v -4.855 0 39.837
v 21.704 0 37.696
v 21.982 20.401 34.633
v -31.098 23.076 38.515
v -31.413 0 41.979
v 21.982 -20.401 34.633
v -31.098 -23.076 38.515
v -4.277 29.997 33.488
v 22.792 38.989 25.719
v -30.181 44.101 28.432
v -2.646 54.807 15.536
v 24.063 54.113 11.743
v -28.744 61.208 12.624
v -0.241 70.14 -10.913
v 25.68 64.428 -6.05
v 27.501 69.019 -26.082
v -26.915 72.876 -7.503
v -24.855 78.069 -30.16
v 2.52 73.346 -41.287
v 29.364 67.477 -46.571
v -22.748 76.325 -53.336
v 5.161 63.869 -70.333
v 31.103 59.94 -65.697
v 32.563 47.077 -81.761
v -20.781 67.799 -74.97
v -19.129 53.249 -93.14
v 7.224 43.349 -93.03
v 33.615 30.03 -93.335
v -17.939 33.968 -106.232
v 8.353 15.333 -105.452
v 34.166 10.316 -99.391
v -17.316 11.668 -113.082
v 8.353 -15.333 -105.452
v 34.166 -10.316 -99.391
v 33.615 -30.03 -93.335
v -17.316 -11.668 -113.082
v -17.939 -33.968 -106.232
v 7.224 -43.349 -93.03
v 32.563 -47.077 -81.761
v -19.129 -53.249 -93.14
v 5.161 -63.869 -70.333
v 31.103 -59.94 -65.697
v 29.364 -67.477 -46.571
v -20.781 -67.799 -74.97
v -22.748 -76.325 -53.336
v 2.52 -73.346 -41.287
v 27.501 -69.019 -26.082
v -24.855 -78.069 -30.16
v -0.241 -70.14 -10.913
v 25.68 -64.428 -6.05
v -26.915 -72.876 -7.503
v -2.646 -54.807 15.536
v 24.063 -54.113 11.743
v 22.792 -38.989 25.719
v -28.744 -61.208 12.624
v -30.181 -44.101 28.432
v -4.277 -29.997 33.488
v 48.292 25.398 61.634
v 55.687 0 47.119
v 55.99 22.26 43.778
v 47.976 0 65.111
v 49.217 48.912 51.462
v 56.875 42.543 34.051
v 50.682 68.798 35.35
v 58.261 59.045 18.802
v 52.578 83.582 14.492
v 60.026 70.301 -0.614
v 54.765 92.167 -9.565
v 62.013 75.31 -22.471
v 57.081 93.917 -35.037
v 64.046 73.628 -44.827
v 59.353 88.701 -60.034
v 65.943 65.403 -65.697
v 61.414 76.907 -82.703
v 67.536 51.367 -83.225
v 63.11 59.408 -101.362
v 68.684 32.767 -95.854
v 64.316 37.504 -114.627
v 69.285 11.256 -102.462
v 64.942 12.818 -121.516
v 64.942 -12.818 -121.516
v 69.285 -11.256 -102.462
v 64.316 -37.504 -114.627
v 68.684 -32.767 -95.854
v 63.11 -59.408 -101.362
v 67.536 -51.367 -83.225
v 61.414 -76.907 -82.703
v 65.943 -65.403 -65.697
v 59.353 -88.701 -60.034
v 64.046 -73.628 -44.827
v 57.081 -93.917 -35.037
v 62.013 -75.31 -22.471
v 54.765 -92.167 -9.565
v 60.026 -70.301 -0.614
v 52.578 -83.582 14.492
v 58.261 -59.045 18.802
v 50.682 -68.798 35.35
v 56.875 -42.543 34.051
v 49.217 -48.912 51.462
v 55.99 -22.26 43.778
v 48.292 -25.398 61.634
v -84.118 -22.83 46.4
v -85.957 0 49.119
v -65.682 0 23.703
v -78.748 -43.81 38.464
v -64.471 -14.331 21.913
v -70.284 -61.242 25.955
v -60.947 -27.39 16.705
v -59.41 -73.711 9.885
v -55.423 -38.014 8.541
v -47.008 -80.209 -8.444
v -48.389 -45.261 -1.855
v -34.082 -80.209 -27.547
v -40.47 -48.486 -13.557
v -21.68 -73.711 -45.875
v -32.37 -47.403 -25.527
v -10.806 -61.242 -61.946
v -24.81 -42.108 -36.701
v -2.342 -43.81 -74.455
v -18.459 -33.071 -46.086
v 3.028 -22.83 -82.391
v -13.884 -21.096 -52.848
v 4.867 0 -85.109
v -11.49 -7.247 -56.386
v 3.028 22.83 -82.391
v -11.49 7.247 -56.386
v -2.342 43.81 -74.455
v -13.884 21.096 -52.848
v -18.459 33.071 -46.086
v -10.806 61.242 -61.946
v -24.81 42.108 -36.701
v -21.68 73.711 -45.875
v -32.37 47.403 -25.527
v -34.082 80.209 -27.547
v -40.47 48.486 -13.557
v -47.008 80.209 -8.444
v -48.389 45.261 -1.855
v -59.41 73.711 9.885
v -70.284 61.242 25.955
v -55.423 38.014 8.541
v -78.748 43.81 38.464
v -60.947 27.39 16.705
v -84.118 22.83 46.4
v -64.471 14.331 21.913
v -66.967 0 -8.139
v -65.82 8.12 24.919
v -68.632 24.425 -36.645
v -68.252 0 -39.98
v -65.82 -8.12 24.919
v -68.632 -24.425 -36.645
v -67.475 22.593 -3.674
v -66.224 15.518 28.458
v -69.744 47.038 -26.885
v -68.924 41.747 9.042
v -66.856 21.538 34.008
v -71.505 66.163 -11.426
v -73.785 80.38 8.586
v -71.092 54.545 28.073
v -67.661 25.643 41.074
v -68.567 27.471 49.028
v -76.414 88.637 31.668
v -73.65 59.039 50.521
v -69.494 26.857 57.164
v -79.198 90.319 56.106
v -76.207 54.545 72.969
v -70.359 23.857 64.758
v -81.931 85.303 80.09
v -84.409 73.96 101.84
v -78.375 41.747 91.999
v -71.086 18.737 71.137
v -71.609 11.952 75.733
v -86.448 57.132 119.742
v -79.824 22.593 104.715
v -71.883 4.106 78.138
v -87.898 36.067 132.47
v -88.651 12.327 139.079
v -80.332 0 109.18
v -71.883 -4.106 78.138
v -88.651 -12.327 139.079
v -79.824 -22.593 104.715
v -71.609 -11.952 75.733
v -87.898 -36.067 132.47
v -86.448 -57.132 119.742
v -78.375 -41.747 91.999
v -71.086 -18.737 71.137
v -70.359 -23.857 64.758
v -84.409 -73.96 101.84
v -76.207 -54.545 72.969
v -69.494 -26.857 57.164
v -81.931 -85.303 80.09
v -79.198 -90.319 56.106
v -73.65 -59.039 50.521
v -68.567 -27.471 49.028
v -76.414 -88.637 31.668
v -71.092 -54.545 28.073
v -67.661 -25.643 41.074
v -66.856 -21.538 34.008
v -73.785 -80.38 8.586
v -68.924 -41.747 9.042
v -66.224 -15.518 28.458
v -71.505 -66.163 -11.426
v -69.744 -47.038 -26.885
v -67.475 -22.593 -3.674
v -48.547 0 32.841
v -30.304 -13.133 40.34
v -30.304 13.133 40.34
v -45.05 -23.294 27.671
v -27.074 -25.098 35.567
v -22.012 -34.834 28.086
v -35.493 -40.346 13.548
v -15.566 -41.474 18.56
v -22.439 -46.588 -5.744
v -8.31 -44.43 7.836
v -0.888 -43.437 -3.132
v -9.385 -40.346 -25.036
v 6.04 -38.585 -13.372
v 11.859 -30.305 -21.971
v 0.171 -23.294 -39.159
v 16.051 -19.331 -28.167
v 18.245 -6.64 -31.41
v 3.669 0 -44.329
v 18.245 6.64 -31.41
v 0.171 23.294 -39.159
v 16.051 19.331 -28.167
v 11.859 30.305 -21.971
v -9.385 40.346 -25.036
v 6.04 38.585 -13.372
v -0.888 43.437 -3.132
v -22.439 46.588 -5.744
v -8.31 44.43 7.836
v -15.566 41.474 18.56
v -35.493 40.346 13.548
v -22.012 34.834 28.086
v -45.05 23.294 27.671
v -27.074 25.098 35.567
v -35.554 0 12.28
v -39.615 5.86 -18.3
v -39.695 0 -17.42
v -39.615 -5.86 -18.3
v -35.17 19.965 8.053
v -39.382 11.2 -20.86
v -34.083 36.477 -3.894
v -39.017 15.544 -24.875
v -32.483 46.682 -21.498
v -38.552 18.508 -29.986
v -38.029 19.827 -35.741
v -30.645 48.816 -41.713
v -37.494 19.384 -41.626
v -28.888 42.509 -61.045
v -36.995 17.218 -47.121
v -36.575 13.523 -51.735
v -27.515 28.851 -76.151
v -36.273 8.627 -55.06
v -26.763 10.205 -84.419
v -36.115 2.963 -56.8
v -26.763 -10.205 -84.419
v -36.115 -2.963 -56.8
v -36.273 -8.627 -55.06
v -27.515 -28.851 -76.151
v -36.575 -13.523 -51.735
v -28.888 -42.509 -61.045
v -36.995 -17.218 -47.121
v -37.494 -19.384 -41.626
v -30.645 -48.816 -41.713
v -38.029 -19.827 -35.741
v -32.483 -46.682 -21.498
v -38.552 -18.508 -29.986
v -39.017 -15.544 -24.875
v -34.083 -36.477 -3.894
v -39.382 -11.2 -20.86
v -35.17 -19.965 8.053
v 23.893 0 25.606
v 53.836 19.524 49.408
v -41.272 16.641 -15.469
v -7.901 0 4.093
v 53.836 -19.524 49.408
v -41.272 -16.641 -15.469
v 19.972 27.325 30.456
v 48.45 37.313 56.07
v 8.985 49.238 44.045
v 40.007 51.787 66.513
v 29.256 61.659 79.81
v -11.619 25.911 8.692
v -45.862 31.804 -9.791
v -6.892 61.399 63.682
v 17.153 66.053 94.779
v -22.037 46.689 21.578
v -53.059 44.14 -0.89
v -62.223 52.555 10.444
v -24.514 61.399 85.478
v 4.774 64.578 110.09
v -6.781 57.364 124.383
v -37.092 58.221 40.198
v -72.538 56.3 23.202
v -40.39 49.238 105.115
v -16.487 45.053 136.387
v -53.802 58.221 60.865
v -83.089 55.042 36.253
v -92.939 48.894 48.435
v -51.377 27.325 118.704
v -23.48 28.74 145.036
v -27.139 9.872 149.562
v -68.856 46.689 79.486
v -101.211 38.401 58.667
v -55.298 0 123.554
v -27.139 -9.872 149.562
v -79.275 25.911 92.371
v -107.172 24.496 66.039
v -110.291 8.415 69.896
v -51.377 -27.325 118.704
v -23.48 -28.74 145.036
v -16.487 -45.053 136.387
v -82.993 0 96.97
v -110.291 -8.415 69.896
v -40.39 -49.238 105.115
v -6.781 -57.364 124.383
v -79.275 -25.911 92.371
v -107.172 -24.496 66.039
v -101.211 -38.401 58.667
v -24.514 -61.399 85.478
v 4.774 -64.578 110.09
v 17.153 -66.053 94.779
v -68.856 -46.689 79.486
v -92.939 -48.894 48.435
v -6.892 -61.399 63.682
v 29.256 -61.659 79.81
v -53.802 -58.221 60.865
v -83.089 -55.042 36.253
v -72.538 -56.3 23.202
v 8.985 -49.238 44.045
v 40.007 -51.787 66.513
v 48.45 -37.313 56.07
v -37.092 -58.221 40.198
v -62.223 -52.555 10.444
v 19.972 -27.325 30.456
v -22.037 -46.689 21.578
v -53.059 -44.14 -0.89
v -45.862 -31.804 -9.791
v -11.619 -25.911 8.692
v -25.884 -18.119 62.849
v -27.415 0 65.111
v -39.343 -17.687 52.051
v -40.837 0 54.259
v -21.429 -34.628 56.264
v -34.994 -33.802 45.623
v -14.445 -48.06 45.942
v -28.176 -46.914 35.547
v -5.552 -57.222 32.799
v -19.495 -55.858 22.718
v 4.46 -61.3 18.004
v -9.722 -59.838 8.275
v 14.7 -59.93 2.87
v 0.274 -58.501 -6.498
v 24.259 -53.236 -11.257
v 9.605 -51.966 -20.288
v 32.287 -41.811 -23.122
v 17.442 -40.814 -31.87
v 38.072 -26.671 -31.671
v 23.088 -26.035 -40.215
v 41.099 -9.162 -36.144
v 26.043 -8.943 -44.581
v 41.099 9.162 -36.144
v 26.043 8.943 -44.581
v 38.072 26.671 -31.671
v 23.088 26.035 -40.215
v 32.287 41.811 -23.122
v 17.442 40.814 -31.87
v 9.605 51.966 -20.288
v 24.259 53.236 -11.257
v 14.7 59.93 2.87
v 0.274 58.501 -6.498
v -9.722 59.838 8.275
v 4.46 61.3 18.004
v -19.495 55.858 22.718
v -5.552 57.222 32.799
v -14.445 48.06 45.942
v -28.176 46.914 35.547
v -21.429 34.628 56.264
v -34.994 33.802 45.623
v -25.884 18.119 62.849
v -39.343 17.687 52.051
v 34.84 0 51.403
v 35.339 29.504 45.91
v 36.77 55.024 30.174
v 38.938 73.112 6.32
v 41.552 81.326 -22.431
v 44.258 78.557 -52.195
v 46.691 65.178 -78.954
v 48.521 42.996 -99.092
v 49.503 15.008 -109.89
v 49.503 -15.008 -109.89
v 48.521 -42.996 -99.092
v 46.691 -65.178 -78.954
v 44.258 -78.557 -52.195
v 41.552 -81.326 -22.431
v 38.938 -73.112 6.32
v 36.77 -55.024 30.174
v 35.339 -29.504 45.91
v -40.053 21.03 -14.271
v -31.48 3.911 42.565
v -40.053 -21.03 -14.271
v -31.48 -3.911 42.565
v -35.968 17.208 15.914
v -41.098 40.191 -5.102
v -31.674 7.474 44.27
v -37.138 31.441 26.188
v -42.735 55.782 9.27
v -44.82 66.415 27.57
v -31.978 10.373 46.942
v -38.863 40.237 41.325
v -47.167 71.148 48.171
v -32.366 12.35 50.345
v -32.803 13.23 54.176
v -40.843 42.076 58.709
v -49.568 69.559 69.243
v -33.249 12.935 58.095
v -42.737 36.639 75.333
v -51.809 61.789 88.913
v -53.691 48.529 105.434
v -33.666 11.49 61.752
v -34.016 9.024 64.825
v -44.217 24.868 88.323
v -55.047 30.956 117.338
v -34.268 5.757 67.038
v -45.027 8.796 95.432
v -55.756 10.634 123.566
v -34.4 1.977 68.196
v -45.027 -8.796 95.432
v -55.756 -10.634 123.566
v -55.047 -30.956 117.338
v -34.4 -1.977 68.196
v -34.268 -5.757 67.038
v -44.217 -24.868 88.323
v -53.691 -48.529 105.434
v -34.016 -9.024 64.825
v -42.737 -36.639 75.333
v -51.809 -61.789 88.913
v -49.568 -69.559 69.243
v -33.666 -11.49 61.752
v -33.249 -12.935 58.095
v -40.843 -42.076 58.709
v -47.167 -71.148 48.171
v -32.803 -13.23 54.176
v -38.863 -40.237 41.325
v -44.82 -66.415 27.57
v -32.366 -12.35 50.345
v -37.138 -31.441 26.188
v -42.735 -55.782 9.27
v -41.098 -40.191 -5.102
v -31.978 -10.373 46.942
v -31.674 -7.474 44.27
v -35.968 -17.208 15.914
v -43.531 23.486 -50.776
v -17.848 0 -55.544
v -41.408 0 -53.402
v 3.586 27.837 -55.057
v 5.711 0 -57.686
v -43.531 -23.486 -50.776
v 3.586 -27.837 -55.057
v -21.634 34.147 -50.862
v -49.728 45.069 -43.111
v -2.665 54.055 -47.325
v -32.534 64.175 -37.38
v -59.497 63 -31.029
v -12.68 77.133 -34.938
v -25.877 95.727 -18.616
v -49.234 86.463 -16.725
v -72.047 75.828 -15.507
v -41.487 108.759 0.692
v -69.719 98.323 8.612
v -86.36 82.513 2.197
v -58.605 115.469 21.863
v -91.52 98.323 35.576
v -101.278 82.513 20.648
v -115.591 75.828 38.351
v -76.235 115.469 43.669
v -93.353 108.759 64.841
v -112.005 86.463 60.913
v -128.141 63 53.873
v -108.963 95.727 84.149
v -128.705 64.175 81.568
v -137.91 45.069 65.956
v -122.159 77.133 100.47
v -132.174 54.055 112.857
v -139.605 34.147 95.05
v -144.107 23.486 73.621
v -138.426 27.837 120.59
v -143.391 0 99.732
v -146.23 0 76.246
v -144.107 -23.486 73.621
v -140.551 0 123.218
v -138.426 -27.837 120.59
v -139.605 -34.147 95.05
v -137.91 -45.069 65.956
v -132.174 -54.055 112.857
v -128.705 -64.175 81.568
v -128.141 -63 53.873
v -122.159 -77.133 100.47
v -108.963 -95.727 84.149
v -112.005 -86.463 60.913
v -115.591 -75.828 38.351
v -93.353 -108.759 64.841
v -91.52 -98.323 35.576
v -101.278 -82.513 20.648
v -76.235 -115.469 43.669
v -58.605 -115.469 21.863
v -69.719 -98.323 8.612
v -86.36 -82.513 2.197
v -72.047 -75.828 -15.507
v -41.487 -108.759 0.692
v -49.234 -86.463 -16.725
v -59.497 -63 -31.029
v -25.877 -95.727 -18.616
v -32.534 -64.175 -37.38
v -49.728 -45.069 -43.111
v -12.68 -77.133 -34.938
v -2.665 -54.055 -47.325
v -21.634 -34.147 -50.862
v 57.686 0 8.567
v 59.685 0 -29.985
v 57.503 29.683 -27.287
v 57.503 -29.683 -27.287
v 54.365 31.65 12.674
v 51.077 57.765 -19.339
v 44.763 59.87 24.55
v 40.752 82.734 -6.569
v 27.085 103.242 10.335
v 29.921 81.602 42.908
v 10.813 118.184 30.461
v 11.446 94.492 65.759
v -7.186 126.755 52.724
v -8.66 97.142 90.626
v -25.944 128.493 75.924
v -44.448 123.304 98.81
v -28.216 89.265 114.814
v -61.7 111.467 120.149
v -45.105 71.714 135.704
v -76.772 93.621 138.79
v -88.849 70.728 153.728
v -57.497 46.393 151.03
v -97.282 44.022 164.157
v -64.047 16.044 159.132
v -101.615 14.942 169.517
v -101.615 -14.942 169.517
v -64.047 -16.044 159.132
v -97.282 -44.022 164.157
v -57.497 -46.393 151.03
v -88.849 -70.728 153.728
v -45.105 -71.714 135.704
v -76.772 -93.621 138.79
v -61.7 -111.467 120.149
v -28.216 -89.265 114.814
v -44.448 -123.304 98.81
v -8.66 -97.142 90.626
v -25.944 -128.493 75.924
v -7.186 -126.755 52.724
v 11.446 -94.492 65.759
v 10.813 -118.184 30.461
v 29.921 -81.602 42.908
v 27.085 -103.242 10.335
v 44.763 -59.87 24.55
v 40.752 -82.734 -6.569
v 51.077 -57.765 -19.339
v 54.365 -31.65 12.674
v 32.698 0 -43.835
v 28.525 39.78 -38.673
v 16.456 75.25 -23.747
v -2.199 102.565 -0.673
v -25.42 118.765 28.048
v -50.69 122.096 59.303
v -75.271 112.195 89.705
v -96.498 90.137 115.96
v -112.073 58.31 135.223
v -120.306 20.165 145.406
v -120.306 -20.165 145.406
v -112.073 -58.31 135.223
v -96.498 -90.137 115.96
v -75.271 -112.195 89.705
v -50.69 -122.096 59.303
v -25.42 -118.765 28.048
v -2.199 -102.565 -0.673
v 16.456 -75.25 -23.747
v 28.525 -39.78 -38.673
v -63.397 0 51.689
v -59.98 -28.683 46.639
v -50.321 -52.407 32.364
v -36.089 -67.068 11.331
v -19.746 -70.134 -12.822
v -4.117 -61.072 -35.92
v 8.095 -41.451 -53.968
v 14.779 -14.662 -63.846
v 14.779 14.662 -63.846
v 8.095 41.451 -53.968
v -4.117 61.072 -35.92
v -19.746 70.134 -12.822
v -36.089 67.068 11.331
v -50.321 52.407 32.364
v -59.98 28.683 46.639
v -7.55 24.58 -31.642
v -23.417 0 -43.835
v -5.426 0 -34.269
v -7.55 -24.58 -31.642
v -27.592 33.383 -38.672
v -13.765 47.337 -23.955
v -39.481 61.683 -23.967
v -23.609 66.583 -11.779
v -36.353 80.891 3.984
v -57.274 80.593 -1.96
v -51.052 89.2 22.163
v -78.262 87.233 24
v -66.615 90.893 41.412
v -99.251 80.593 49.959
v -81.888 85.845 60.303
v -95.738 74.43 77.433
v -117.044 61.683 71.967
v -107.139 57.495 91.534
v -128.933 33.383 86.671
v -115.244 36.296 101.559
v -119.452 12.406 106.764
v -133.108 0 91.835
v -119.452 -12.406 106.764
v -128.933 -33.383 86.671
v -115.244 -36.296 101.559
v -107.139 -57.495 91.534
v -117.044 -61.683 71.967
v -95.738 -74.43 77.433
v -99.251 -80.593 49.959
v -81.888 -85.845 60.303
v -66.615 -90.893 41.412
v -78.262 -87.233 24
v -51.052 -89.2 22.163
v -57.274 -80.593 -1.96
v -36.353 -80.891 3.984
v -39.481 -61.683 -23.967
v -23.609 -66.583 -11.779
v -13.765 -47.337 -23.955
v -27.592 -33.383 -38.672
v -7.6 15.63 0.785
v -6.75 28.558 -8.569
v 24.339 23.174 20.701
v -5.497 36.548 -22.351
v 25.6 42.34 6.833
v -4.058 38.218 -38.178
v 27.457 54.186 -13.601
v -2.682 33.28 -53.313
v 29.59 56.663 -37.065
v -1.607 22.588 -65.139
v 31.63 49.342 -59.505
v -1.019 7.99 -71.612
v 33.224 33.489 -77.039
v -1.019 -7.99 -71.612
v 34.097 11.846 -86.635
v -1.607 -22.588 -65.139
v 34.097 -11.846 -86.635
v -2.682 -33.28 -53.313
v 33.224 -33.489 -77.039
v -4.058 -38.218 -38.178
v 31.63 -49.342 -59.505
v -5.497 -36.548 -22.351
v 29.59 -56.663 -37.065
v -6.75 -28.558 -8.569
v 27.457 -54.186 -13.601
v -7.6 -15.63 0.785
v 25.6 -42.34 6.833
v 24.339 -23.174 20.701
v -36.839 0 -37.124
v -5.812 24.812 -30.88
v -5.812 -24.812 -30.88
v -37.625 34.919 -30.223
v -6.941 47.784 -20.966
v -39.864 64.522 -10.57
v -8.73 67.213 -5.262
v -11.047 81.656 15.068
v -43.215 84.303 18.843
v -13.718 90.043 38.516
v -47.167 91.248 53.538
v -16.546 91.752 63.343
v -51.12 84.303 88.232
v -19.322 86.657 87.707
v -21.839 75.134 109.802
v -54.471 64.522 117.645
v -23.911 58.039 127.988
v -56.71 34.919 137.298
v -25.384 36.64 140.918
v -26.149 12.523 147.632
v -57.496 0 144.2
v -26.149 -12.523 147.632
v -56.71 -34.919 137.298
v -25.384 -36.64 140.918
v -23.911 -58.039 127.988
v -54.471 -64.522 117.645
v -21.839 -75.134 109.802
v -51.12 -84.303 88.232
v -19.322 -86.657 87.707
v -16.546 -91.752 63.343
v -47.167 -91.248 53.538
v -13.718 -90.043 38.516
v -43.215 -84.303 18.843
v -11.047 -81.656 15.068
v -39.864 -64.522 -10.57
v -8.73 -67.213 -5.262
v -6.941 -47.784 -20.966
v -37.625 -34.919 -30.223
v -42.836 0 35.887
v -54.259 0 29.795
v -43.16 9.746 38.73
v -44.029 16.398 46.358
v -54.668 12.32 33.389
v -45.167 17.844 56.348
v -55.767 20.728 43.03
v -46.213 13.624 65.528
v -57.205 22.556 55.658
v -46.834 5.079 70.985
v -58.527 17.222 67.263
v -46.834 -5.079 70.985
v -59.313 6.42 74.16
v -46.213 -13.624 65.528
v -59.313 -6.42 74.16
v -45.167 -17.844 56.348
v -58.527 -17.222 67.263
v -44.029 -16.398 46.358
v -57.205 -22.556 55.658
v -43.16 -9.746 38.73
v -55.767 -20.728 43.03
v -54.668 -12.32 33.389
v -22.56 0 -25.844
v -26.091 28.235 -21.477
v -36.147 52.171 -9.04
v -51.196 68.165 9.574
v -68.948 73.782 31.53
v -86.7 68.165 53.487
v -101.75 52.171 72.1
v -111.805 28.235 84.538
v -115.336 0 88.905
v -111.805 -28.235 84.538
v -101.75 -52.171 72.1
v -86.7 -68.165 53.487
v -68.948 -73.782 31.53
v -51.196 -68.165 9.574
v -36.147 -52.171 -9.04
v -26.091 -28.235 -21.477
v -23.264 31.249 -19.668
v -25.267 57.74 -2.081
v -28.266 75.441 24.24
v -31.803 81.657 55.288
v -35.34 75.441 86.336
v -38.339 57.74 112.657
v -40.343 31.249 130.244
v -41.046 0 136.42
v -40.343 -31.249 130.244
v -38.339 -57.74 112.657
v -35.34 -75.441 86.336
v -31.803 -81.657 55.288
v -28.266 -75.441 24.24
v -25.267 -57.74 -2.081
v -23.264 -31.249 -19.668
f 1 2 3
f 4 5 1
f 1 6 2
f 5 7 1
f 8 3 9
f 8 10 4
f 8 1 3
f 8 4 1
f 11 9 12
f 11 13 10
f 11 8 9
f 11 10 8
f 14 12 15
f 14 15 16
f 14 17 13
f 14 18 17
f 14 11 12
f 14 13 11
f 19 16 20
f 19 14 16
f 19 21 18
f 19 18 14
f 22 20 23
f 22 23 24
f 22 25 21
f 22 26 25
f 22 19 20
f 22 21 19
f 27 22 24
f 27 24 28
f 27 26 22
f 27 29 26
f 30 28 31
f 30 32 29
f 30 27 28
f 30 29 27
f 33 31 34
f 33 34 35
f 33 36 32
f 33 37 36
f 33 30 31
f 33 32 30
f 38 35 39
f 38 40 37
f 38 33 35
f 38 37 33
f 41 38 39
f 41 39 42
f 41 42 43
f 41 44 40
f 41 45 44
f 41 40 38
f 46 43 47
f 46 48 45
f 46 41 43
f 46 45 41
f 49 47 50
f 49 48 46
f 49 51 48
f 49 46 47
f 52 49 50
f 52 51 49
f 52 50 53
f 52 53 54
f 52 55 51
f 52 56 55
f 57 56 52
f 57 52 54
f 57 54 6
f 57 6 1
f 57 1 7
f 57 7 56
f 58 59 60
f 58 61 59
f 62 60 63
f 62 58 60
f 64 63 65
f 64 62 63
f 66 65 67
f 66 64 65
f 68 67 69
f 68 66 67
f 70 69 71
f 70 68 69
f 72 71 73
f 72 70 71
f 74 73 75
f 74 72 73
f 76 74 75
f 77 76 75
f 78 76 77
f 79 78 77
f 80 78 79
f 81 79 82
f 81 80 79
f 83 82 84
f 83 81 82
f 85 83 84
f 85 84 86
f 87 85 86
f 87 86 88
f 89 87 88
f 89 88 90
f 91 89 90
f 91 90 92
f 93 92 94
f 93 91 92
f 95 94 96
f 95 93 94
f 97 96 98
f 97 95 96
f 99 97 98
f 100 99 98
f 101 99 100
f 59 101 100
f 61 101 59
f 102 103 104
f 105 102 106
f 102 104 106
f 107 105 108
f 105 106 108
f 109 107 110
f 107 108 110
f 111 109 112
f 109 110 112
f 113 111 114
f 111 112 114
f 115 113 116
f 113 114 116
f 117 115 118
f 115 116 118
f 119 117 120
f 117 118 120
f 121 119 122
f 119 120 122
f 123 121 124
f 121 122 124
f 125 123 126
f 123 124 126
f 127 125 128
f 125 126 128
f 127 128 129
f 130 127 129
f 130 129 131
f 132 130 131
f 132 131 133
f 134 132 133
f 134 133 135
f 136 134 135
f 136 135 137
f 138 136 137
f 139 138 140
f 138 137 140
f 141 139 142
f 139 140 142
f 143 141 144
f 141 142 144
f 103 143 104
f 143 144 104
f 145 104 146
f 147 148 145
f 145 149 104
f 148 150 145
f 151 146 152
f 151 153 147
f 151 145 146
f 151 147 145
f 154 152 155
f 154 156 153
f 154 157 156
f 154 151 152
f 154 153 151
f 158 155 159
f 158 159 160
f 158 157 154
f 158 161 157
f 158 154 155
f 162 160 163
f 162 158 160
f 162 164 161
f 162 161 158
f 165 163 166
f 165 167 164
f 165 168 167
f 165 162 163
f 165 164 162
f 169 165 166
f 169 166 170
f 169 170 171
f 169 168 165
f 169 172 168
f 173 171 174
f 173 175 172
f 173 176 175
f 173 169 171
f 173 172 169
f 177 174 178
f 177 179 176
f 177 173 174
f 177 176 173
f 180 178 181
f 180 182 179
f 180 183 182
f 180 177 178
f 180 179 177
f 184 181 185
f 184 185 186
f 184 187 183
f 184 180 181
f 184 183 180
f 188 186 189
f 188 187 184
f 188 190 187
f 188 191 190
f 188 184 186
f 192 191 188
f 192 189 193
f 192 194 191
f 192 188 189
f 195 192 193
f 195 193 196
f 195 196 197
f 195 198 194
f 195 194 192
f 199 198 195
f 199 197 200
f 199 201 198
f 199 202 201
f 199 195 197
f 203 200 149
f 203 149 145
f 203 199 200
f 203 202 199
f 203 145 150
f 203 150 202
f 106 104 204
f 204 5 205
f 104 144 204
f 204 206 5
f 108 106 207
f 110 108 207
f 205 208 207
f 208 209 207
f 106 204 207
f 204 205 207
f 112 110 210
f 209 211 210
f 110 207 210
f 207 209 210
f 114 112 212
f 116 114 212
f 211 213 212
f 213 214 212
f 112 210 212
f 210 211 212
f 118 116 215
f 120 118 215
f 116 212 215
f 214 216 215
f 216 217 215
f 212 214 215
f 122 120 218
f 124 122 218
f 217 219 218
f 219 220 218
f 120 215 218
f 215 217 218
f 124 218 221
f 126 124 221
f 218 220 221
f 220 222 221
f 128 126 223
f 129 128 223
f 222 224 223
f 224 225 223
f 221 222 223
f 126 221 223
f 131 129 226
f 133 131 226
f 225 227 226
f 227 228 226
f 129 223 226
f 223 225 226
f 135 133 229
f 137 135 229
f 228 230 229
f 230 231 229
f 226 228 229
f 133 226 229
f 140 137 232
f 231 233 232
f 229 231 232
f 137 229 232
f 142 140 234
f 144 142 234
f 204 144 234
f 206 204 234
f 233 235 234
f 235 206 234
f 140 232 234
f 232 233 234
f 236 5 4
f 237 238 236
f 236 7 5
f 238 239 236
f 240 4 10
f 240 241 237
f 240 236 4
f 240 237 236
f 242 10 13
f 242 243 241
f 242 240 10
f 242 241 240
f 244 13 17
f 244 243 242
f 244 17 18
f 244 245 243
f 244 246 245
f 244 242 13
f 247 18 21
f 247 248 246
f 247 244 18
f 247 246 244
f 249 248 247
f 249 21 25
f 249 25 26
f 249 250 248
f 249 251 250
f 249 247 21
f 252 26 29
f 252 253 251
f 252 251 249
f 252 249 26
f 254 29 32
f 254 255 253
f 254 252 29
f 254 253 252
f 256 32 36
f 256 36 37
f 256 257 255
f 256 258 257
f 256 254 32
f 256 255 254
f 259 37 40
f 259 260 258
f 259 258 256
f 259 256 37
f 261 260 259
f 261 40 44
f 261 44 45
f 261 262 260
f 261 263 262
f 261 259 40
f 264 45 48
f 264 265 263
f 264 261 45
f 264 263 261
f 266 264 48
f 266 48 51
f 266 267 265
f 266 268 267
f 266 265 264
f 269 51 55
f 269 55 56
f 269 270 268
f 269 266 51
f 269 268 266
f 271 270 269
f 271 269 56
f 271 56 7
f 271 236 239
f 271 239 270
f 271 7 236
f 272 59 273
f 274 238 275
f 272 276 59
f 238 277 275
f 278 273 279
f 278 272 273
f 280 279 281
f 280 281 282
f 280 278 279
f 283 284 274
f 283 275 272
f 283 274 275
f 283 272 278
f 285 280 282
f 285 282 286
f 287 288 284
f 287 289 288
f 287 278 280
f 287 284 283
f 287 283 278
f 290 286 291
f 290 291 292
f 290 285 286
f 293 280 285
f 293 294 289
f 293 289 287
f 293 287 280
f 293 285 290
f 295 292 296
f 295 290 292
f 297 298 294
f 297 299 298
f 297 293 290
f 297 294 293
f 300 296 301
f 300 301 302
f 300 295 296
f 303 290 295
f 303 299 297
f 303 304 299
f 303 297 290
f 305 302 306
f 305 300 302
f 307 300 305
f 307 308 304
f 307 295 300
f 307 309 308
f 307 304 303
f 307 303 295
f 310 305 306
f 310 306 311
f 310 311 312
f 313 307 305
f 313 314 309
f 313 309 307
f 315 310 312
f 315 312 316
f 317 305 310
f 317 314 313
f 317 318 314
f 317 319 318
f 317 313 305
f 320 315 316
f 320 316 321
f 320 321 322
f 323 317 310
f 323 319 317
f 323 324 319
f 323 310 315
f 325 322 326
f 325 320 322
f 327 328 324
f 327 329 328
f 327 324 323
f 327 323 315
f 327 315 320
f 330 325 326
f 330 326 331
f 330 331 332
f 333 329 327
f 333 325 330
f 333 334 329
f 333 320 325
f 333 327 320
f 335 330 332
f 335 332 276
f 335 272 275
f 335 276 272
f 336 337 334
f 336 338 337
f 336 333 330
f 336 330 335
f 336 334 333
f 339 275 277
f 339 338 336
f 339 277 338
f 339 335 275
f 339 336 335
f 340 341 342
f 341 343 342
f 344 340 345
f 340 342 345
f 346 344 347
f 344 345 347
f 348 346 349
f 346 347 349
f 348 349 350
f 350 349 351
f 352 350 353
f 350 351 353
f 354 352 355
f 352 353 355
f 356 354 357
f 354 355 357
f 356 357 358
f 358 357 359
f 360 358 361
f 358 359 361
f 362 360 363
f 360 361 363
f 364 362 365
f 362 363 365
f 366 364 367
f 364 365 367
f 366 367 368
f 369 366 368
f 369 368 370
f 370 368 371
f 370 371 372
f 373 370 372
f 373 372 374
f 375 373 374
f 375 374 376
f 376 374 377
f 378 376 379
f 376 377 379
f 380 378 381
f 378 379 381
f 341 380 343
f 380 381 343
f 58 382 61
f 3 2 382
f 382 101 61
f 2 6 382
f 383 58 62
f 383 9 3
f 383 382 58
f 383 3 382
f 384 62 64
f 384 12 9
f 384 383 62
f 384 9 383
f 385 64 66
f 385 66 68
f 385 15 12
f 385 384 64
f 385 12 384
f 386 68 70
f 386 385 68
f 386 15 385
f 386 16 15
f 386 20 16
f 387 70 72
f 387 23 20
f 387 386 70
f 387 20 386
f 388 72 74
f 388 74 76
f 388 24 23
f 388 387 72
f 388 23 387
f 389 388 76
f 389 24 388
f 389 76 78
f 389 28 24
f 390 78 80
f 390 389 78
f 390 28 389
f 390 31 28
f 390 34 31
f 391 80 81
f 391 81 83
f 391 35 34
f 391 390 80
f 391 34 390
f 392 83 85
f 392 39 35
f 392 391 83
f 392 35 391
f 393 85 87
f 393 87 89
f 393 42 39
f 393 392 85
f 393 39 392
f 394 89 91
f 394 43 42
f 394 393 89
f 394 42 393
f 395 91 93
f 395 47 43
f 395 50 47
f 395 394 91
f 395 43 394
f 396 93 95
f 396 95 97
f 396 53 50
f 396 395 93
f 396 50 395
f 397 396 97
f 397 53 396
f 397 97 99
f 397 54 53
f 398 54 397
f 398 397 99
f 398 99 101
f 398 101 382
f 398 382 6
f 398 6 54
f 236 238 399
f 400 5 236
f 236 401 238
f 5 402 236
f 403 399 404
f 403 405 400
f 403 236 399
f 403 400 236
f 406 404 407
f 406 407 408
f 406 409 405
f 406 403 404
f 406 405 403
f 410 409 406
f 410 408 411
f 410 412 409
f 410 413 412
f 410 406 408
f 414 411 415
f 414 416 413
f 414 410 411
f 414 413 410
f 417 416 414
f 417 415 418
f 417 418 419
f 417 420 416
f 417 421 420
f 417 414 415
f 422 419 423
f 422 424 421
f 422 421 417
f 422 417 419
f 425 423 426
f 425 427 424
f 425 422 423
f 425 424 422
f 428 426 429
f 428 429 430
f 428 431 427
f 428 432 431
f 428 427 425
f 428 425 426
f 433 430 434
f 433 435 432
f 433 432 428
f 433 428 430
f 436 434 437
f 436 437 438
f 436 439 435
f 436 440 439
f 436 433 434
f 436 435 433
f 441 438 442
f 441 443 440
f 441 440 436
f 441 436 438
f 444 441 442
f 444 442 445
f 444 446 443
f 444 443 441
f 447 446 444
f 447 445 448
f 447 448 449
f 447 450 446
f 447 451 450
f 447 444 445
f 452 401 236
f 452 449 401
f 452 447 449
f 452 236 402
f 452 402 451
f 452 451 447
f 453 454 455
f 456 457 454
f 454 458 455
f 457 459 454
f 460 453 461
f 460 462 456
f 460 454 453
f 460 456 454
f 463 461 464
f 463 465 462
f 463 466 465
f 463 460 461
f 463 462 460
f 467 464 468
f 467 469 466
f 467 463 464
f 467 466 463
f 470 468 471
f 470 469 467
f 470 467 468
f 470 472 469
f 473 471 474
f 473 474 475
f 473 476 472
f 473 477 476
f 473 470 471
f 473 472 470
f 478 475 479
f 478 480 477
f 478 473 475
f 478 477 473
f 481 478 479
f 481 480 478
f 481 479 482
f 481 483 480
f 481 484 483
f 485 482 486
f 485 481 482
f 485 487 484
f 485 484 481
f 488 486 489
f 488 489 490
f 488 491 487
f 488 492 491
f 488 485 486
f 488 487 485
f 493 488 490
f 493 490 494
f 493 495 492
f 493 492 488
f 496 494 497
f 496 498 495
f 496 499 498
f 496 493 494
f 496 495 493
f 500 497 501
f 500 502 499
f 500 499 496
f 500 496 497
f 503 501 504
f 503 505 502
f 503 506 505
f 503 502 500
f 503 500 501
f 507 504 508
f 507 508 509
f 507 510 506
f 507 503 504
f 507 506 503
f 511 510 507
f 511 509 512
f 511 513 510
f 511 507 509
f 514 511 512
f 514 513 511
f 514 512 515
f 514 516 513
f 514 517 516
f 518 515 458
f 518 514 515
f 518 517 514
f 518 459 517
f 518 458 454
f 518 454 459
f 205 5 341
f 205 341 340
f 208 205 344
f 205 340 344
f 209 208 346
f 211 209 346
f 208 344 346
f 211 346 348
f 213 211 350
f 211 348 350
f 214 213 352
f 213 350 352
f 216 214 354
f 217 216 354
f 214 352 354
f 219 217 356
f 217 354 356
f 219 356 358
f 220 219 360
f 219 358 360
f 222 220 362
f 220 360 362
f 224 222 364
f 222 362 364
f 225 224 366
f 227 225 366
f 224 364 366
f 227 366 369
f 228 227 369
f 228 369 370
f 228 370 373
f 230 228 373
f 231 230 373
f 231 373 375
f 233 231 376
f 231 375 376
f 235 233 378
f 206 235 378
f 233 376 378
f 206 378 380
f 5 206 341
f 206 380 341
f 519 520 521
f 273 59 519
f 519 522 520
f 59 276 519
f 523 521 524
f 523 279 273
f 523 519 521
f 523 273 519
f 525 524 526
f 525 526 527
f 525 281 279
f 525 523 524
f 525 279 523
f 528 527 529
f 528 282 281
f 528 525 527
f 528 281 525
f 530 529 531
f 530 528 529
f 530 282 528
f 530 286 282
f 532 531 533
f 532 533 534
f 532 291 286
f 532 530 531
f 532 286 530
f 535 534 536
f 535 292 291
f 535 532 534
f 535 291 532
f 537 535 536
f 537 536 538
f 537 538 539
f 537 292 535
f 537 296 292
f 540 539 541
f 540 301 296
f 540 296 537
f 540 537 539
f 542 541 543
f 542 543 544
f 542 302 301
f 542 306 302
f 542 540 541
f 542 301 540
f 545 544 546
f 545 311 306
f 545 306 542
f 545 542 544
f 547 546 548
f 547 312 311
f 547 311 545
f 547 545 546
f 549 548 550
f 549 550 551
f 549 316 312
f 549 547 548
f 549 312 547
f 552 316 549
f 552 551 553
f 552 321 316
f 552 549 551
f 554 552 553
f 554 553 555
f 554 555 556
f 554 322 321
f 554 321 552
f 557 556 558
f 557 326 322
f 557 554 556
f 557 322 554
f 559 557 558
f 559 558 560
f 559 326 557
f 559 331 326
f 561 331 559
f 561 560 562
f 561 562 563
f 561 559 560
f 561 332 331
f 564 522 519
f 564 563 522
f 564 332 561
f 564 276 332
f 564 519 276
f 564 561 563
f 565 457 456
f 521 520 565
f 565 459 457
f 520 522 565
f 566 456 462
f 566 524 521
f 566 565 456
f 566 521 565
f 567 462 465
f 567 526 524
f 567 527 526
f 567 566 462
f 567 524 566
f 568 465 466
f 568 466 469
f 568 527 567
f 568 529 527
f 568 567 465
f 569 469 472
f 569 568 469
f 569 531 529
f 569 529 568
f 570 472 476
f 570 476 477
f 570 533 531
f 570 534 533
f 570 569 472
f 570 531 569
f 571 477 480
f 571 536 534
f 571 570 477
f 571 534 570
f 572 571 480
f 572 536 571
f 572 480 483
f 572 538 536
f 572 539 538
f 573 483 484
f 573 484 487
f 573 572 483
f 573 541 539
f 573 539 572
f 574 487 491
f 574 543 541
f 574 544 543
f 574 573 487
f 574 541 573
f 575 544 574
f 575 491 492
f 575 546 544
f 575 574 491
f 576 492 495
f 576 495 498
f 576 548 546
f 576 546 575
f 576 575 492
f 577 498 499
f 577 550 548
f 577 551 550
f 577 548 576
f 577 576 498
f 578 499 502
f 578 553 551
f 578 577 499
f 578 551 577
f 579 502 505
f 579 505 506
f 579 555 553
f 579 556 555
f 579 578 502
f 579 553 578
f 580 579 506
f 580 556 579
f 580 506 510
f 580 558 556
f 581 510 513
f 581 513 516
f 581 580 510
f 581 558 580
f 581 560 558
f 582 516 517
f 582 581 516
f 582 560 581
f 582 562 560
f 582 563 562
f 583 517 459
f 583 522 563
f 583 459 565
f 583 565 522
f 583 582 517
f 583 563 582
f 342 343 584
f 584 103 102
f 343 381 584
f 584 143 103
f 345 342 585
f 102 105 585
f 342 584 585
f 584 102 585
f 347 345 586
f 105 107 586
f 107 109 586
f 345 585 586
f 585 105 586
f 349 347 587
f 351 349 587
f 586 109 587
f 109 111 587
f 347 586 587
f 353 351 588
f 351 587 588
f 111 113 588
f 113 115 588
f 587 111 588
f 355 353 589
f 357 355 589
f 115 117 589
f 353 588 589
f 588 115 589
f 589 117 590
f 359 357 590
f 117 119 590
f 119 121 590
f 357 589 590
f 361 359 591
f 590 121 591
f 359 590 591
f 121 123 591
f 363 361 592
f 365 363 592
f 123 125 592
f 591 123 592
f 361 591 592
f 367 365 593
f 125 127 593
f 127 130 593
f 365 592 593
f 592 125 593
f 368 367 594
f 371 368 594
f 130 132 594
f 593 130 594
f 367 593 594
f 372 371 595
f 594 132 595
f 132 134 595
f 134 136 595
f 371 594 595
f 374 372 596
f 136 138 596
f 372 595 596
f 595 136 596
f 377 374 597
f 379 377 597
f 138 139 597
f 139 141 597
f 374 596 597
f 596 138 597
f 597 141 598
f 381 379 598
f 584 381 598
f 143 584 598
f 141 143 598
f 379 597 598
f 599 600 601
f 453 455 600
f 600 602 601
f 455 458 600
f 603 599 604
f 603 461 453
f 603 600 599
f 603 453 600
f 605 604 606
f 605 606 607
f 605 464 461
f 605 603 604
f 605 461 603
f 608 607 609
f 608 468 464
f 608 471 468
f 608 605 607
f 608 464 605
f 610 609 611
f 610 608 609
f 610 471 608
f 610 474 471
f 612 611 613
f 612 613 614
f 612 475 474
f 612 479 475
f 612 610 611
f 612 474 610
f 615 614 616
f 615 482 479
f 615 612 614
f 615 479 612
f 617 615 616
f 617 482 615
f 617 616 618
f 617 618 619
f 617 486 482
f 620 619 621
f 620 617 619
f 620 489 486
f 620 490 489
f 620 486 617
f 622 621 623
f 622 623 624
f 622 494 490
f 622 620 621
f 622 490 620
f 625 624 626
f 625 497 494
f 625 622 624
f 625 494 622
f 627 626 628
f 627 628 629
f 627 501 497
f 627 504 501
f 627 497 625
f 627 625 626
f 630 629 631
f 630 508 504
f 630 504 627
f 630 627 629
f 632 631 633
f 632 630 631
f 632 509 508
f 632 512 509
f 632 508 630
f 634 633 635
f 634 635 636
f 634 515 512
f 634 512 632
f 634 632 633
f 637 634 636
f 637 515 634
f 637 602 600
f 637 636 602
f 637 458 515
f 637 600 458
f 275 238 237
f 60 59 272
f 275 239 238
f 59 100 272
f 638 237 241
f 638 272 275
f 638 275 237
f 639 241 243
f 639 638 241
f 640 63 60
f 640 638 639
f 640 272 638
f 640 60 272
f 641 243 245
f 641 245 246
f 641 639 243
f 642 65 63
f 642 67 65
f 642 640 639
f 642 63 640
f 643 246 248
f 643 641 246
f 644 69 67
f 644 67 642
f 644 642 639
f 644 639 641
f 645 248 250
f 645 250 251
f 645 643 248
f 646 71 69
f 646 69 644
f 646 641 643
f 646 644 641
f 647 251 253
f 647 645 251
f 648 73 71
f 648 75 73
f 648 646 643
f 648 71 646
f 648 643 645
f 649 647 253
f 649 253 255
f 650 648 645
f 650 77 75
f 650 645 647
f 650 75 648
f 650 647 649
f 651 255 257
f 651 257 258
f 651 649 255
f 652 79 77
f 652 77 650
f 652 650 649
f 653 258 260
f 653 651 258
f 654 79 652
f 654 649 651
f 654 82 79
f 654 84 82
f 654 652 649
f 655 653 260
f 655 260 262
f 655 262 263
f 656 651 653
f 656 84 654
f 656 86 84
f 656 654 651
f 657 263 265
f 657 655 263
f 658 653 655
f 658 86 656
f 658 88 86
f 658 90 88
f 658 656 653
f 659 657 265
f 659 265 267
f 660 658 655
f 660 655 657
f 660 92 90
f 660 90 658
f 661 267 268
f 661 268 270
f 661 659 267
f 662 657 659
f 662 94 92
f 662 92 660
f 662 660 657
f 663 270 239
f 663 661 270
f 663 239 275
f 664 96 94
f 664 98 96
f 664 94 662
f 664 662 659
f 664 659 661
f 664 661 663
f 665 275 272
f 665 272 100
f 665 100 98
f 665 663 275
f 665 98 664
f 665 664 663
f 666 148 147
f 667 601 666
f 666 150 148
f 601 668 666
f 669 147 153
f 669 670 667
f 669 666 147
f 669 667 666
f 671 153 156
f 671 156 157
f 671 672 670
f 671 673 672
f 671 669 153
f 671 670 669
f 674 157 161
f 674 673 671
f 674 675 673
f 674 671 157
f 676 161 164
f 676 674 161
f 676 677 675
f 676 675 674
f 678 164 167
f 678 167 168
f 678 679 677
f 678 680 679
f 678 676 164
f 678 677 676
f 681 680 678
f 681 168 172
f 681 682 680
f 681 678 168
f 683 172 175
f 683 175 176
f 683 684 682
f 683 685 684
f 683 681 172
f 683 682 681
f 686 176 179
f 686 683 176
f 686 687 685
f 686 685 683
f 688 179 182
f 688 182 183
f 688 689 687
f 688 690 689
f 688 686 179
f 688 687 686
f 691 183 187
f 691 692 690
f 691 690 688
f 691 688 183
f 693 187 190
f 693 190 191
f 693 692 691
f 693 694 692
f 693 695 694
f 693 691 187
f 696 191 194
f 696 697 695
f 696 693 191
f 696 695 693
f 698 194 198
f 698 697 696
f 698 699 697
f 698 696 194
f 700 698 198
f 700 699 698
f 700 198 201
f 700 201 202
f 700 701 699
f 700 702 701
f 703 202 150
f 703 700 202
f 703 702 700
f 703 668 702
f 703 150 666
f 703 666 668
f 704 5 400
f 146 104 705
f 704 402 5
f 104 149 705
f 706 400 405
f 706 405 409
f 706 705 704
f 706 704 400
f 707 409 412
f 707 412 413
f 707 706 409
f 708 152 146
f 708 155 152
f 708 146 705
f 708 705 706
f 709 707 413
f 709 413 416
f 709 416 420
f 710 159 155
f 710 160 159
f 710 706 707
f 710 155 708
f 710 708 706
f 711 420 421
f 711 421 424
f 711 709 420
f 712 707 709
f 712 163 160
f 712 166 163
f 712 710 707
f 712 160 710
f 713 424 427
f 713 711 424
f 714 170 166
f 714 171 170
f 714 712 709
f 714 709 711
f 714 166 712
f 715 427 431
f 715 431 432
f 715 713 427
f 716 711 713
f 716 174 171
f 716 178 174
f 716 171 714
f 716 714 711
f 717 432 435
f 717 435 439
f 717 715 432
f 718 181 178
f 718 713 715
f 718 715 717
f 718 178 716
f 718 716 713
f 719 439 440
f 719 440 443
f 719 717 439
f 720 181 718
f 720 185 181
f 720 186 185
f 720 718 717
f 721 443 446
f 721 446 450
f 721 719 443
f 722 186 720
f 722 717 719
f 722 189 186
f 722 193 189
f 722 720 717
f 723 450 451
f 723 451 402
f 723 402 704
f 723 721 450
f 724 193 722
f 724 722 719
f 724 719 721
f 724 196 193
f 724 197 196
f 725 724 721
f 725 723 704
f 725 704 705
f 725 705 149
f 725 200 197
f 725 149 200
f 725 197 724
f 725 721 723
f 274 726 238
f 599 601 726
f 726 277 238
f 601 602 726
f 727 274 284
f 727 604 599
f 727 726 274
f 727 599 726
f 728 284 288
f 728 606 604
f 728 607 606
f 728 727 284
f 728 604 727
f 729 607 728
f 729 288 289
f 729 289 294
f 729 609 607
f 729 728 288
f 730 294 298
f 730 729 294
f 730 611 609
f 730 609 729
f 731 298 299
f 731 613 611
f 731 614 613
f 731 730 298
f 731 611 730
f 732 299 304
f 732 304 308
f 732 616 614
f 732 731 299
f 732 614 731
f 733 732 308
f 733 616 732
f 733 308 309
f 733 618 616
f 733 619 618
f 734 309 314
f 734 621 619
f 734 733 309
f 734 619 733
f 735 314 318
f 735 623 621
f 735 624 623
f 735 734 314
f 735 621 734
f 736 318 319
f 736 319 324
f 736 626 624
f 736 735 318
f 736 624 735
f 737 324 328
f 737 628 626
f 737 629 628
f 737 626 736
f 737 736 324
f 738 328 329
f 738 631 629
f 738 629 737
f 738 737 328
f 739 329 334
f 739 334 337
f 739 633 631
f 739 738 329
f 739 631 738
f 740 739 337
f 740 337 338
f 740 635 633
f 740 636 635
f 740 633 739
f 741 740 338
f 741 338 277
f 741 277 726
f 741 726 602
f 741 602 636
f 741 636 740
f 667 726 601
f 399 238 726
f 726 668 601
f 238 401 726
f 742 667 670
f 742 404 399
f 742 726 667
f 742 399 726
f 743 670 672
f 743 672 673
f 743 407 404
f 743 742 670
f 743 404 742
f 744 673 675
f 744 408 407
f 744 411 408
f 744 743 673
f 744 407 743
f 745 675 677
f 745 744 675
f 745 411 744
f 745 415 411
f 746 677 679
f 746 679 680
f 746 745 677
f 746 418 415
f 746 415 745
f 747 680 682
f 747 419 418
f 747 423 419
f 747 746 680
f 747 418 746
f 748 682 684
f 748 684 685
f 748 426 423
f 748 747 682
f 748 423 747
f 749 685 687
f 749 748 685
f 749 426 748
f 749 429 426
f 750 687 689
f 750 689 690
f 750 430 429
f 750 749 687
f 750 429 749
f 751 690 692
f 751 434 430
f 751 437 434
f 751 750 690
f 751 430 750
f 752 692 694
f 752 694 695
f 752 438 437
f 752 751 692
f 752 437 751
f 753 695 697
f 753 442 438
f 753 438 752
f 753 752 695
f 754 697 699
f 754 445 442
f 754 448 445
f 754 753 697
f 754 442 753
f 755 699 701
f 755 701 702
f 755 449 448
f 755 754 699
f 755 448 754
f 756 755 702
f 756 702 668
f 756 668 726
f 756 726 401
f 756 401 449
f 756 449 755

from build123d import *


with BuildPart() as f1:
    # F0 (on Front) → F1 (revolve)
    with BuildSketch(Plane.XZ):
        Polygon((-65.681711, 23.702536), (-31.412993, 41.979186), (-27.414974, 65.110572), (-40.836889, 54.258808), (-85.957371, 49.118504), align=None)
    revolve(axis=Axis((7.996036, 0, 14.84978), (0.828216, 0, 0.560409)))


with BuildPart() as f2:
    # F0 (on Front) → F2 (revolve)
    with BuildSketch(Plane.XZ):
        Polygon((-39.6946, -17.419931), (-31.412993, 41.979186), (-65.681711, 23.702536), (-68.251863, -39.980169), (-5.425877, -34.268718), align=None)
    revolve(axis=Axis((-63.39713, 0, 51.688656), (0.993573, 0, 0.113192)))


with BuildPart() as f3:
    # F0 (on Front) → F3 (revolve)
    with BuildSketch(Plane.XZ):
        Polygon((55.686671, 47.119491), (-39.6946, -17.419931), (-5.425877, -34.268718), (-41.408036, -53.402089), (5.711456, -57.685681), (59.684694, -29.985128), align=None)
    revolve(axis=Axis((-34.125932, 0, 59.68469), (0.77763, 0, 0.628722)))


with BuildPart() as f4:
    # F0 (on Front) → F4 (revolve)
    with BuildSketch(Plane.XZ):
        Polygon((21.703528, 37.695594), (-31.412993, 41.979186), (-39.6946, -17.419931), (55.686671, 47.119491), (47.976214, 65.110572), align=None)
    revolve(axis=Axis((-36.83887, 0, -37.124444), (-0.995893, 0, -0.090536)))


solid = Compound([f1.part, f2.part, f3.part, f4.part])
